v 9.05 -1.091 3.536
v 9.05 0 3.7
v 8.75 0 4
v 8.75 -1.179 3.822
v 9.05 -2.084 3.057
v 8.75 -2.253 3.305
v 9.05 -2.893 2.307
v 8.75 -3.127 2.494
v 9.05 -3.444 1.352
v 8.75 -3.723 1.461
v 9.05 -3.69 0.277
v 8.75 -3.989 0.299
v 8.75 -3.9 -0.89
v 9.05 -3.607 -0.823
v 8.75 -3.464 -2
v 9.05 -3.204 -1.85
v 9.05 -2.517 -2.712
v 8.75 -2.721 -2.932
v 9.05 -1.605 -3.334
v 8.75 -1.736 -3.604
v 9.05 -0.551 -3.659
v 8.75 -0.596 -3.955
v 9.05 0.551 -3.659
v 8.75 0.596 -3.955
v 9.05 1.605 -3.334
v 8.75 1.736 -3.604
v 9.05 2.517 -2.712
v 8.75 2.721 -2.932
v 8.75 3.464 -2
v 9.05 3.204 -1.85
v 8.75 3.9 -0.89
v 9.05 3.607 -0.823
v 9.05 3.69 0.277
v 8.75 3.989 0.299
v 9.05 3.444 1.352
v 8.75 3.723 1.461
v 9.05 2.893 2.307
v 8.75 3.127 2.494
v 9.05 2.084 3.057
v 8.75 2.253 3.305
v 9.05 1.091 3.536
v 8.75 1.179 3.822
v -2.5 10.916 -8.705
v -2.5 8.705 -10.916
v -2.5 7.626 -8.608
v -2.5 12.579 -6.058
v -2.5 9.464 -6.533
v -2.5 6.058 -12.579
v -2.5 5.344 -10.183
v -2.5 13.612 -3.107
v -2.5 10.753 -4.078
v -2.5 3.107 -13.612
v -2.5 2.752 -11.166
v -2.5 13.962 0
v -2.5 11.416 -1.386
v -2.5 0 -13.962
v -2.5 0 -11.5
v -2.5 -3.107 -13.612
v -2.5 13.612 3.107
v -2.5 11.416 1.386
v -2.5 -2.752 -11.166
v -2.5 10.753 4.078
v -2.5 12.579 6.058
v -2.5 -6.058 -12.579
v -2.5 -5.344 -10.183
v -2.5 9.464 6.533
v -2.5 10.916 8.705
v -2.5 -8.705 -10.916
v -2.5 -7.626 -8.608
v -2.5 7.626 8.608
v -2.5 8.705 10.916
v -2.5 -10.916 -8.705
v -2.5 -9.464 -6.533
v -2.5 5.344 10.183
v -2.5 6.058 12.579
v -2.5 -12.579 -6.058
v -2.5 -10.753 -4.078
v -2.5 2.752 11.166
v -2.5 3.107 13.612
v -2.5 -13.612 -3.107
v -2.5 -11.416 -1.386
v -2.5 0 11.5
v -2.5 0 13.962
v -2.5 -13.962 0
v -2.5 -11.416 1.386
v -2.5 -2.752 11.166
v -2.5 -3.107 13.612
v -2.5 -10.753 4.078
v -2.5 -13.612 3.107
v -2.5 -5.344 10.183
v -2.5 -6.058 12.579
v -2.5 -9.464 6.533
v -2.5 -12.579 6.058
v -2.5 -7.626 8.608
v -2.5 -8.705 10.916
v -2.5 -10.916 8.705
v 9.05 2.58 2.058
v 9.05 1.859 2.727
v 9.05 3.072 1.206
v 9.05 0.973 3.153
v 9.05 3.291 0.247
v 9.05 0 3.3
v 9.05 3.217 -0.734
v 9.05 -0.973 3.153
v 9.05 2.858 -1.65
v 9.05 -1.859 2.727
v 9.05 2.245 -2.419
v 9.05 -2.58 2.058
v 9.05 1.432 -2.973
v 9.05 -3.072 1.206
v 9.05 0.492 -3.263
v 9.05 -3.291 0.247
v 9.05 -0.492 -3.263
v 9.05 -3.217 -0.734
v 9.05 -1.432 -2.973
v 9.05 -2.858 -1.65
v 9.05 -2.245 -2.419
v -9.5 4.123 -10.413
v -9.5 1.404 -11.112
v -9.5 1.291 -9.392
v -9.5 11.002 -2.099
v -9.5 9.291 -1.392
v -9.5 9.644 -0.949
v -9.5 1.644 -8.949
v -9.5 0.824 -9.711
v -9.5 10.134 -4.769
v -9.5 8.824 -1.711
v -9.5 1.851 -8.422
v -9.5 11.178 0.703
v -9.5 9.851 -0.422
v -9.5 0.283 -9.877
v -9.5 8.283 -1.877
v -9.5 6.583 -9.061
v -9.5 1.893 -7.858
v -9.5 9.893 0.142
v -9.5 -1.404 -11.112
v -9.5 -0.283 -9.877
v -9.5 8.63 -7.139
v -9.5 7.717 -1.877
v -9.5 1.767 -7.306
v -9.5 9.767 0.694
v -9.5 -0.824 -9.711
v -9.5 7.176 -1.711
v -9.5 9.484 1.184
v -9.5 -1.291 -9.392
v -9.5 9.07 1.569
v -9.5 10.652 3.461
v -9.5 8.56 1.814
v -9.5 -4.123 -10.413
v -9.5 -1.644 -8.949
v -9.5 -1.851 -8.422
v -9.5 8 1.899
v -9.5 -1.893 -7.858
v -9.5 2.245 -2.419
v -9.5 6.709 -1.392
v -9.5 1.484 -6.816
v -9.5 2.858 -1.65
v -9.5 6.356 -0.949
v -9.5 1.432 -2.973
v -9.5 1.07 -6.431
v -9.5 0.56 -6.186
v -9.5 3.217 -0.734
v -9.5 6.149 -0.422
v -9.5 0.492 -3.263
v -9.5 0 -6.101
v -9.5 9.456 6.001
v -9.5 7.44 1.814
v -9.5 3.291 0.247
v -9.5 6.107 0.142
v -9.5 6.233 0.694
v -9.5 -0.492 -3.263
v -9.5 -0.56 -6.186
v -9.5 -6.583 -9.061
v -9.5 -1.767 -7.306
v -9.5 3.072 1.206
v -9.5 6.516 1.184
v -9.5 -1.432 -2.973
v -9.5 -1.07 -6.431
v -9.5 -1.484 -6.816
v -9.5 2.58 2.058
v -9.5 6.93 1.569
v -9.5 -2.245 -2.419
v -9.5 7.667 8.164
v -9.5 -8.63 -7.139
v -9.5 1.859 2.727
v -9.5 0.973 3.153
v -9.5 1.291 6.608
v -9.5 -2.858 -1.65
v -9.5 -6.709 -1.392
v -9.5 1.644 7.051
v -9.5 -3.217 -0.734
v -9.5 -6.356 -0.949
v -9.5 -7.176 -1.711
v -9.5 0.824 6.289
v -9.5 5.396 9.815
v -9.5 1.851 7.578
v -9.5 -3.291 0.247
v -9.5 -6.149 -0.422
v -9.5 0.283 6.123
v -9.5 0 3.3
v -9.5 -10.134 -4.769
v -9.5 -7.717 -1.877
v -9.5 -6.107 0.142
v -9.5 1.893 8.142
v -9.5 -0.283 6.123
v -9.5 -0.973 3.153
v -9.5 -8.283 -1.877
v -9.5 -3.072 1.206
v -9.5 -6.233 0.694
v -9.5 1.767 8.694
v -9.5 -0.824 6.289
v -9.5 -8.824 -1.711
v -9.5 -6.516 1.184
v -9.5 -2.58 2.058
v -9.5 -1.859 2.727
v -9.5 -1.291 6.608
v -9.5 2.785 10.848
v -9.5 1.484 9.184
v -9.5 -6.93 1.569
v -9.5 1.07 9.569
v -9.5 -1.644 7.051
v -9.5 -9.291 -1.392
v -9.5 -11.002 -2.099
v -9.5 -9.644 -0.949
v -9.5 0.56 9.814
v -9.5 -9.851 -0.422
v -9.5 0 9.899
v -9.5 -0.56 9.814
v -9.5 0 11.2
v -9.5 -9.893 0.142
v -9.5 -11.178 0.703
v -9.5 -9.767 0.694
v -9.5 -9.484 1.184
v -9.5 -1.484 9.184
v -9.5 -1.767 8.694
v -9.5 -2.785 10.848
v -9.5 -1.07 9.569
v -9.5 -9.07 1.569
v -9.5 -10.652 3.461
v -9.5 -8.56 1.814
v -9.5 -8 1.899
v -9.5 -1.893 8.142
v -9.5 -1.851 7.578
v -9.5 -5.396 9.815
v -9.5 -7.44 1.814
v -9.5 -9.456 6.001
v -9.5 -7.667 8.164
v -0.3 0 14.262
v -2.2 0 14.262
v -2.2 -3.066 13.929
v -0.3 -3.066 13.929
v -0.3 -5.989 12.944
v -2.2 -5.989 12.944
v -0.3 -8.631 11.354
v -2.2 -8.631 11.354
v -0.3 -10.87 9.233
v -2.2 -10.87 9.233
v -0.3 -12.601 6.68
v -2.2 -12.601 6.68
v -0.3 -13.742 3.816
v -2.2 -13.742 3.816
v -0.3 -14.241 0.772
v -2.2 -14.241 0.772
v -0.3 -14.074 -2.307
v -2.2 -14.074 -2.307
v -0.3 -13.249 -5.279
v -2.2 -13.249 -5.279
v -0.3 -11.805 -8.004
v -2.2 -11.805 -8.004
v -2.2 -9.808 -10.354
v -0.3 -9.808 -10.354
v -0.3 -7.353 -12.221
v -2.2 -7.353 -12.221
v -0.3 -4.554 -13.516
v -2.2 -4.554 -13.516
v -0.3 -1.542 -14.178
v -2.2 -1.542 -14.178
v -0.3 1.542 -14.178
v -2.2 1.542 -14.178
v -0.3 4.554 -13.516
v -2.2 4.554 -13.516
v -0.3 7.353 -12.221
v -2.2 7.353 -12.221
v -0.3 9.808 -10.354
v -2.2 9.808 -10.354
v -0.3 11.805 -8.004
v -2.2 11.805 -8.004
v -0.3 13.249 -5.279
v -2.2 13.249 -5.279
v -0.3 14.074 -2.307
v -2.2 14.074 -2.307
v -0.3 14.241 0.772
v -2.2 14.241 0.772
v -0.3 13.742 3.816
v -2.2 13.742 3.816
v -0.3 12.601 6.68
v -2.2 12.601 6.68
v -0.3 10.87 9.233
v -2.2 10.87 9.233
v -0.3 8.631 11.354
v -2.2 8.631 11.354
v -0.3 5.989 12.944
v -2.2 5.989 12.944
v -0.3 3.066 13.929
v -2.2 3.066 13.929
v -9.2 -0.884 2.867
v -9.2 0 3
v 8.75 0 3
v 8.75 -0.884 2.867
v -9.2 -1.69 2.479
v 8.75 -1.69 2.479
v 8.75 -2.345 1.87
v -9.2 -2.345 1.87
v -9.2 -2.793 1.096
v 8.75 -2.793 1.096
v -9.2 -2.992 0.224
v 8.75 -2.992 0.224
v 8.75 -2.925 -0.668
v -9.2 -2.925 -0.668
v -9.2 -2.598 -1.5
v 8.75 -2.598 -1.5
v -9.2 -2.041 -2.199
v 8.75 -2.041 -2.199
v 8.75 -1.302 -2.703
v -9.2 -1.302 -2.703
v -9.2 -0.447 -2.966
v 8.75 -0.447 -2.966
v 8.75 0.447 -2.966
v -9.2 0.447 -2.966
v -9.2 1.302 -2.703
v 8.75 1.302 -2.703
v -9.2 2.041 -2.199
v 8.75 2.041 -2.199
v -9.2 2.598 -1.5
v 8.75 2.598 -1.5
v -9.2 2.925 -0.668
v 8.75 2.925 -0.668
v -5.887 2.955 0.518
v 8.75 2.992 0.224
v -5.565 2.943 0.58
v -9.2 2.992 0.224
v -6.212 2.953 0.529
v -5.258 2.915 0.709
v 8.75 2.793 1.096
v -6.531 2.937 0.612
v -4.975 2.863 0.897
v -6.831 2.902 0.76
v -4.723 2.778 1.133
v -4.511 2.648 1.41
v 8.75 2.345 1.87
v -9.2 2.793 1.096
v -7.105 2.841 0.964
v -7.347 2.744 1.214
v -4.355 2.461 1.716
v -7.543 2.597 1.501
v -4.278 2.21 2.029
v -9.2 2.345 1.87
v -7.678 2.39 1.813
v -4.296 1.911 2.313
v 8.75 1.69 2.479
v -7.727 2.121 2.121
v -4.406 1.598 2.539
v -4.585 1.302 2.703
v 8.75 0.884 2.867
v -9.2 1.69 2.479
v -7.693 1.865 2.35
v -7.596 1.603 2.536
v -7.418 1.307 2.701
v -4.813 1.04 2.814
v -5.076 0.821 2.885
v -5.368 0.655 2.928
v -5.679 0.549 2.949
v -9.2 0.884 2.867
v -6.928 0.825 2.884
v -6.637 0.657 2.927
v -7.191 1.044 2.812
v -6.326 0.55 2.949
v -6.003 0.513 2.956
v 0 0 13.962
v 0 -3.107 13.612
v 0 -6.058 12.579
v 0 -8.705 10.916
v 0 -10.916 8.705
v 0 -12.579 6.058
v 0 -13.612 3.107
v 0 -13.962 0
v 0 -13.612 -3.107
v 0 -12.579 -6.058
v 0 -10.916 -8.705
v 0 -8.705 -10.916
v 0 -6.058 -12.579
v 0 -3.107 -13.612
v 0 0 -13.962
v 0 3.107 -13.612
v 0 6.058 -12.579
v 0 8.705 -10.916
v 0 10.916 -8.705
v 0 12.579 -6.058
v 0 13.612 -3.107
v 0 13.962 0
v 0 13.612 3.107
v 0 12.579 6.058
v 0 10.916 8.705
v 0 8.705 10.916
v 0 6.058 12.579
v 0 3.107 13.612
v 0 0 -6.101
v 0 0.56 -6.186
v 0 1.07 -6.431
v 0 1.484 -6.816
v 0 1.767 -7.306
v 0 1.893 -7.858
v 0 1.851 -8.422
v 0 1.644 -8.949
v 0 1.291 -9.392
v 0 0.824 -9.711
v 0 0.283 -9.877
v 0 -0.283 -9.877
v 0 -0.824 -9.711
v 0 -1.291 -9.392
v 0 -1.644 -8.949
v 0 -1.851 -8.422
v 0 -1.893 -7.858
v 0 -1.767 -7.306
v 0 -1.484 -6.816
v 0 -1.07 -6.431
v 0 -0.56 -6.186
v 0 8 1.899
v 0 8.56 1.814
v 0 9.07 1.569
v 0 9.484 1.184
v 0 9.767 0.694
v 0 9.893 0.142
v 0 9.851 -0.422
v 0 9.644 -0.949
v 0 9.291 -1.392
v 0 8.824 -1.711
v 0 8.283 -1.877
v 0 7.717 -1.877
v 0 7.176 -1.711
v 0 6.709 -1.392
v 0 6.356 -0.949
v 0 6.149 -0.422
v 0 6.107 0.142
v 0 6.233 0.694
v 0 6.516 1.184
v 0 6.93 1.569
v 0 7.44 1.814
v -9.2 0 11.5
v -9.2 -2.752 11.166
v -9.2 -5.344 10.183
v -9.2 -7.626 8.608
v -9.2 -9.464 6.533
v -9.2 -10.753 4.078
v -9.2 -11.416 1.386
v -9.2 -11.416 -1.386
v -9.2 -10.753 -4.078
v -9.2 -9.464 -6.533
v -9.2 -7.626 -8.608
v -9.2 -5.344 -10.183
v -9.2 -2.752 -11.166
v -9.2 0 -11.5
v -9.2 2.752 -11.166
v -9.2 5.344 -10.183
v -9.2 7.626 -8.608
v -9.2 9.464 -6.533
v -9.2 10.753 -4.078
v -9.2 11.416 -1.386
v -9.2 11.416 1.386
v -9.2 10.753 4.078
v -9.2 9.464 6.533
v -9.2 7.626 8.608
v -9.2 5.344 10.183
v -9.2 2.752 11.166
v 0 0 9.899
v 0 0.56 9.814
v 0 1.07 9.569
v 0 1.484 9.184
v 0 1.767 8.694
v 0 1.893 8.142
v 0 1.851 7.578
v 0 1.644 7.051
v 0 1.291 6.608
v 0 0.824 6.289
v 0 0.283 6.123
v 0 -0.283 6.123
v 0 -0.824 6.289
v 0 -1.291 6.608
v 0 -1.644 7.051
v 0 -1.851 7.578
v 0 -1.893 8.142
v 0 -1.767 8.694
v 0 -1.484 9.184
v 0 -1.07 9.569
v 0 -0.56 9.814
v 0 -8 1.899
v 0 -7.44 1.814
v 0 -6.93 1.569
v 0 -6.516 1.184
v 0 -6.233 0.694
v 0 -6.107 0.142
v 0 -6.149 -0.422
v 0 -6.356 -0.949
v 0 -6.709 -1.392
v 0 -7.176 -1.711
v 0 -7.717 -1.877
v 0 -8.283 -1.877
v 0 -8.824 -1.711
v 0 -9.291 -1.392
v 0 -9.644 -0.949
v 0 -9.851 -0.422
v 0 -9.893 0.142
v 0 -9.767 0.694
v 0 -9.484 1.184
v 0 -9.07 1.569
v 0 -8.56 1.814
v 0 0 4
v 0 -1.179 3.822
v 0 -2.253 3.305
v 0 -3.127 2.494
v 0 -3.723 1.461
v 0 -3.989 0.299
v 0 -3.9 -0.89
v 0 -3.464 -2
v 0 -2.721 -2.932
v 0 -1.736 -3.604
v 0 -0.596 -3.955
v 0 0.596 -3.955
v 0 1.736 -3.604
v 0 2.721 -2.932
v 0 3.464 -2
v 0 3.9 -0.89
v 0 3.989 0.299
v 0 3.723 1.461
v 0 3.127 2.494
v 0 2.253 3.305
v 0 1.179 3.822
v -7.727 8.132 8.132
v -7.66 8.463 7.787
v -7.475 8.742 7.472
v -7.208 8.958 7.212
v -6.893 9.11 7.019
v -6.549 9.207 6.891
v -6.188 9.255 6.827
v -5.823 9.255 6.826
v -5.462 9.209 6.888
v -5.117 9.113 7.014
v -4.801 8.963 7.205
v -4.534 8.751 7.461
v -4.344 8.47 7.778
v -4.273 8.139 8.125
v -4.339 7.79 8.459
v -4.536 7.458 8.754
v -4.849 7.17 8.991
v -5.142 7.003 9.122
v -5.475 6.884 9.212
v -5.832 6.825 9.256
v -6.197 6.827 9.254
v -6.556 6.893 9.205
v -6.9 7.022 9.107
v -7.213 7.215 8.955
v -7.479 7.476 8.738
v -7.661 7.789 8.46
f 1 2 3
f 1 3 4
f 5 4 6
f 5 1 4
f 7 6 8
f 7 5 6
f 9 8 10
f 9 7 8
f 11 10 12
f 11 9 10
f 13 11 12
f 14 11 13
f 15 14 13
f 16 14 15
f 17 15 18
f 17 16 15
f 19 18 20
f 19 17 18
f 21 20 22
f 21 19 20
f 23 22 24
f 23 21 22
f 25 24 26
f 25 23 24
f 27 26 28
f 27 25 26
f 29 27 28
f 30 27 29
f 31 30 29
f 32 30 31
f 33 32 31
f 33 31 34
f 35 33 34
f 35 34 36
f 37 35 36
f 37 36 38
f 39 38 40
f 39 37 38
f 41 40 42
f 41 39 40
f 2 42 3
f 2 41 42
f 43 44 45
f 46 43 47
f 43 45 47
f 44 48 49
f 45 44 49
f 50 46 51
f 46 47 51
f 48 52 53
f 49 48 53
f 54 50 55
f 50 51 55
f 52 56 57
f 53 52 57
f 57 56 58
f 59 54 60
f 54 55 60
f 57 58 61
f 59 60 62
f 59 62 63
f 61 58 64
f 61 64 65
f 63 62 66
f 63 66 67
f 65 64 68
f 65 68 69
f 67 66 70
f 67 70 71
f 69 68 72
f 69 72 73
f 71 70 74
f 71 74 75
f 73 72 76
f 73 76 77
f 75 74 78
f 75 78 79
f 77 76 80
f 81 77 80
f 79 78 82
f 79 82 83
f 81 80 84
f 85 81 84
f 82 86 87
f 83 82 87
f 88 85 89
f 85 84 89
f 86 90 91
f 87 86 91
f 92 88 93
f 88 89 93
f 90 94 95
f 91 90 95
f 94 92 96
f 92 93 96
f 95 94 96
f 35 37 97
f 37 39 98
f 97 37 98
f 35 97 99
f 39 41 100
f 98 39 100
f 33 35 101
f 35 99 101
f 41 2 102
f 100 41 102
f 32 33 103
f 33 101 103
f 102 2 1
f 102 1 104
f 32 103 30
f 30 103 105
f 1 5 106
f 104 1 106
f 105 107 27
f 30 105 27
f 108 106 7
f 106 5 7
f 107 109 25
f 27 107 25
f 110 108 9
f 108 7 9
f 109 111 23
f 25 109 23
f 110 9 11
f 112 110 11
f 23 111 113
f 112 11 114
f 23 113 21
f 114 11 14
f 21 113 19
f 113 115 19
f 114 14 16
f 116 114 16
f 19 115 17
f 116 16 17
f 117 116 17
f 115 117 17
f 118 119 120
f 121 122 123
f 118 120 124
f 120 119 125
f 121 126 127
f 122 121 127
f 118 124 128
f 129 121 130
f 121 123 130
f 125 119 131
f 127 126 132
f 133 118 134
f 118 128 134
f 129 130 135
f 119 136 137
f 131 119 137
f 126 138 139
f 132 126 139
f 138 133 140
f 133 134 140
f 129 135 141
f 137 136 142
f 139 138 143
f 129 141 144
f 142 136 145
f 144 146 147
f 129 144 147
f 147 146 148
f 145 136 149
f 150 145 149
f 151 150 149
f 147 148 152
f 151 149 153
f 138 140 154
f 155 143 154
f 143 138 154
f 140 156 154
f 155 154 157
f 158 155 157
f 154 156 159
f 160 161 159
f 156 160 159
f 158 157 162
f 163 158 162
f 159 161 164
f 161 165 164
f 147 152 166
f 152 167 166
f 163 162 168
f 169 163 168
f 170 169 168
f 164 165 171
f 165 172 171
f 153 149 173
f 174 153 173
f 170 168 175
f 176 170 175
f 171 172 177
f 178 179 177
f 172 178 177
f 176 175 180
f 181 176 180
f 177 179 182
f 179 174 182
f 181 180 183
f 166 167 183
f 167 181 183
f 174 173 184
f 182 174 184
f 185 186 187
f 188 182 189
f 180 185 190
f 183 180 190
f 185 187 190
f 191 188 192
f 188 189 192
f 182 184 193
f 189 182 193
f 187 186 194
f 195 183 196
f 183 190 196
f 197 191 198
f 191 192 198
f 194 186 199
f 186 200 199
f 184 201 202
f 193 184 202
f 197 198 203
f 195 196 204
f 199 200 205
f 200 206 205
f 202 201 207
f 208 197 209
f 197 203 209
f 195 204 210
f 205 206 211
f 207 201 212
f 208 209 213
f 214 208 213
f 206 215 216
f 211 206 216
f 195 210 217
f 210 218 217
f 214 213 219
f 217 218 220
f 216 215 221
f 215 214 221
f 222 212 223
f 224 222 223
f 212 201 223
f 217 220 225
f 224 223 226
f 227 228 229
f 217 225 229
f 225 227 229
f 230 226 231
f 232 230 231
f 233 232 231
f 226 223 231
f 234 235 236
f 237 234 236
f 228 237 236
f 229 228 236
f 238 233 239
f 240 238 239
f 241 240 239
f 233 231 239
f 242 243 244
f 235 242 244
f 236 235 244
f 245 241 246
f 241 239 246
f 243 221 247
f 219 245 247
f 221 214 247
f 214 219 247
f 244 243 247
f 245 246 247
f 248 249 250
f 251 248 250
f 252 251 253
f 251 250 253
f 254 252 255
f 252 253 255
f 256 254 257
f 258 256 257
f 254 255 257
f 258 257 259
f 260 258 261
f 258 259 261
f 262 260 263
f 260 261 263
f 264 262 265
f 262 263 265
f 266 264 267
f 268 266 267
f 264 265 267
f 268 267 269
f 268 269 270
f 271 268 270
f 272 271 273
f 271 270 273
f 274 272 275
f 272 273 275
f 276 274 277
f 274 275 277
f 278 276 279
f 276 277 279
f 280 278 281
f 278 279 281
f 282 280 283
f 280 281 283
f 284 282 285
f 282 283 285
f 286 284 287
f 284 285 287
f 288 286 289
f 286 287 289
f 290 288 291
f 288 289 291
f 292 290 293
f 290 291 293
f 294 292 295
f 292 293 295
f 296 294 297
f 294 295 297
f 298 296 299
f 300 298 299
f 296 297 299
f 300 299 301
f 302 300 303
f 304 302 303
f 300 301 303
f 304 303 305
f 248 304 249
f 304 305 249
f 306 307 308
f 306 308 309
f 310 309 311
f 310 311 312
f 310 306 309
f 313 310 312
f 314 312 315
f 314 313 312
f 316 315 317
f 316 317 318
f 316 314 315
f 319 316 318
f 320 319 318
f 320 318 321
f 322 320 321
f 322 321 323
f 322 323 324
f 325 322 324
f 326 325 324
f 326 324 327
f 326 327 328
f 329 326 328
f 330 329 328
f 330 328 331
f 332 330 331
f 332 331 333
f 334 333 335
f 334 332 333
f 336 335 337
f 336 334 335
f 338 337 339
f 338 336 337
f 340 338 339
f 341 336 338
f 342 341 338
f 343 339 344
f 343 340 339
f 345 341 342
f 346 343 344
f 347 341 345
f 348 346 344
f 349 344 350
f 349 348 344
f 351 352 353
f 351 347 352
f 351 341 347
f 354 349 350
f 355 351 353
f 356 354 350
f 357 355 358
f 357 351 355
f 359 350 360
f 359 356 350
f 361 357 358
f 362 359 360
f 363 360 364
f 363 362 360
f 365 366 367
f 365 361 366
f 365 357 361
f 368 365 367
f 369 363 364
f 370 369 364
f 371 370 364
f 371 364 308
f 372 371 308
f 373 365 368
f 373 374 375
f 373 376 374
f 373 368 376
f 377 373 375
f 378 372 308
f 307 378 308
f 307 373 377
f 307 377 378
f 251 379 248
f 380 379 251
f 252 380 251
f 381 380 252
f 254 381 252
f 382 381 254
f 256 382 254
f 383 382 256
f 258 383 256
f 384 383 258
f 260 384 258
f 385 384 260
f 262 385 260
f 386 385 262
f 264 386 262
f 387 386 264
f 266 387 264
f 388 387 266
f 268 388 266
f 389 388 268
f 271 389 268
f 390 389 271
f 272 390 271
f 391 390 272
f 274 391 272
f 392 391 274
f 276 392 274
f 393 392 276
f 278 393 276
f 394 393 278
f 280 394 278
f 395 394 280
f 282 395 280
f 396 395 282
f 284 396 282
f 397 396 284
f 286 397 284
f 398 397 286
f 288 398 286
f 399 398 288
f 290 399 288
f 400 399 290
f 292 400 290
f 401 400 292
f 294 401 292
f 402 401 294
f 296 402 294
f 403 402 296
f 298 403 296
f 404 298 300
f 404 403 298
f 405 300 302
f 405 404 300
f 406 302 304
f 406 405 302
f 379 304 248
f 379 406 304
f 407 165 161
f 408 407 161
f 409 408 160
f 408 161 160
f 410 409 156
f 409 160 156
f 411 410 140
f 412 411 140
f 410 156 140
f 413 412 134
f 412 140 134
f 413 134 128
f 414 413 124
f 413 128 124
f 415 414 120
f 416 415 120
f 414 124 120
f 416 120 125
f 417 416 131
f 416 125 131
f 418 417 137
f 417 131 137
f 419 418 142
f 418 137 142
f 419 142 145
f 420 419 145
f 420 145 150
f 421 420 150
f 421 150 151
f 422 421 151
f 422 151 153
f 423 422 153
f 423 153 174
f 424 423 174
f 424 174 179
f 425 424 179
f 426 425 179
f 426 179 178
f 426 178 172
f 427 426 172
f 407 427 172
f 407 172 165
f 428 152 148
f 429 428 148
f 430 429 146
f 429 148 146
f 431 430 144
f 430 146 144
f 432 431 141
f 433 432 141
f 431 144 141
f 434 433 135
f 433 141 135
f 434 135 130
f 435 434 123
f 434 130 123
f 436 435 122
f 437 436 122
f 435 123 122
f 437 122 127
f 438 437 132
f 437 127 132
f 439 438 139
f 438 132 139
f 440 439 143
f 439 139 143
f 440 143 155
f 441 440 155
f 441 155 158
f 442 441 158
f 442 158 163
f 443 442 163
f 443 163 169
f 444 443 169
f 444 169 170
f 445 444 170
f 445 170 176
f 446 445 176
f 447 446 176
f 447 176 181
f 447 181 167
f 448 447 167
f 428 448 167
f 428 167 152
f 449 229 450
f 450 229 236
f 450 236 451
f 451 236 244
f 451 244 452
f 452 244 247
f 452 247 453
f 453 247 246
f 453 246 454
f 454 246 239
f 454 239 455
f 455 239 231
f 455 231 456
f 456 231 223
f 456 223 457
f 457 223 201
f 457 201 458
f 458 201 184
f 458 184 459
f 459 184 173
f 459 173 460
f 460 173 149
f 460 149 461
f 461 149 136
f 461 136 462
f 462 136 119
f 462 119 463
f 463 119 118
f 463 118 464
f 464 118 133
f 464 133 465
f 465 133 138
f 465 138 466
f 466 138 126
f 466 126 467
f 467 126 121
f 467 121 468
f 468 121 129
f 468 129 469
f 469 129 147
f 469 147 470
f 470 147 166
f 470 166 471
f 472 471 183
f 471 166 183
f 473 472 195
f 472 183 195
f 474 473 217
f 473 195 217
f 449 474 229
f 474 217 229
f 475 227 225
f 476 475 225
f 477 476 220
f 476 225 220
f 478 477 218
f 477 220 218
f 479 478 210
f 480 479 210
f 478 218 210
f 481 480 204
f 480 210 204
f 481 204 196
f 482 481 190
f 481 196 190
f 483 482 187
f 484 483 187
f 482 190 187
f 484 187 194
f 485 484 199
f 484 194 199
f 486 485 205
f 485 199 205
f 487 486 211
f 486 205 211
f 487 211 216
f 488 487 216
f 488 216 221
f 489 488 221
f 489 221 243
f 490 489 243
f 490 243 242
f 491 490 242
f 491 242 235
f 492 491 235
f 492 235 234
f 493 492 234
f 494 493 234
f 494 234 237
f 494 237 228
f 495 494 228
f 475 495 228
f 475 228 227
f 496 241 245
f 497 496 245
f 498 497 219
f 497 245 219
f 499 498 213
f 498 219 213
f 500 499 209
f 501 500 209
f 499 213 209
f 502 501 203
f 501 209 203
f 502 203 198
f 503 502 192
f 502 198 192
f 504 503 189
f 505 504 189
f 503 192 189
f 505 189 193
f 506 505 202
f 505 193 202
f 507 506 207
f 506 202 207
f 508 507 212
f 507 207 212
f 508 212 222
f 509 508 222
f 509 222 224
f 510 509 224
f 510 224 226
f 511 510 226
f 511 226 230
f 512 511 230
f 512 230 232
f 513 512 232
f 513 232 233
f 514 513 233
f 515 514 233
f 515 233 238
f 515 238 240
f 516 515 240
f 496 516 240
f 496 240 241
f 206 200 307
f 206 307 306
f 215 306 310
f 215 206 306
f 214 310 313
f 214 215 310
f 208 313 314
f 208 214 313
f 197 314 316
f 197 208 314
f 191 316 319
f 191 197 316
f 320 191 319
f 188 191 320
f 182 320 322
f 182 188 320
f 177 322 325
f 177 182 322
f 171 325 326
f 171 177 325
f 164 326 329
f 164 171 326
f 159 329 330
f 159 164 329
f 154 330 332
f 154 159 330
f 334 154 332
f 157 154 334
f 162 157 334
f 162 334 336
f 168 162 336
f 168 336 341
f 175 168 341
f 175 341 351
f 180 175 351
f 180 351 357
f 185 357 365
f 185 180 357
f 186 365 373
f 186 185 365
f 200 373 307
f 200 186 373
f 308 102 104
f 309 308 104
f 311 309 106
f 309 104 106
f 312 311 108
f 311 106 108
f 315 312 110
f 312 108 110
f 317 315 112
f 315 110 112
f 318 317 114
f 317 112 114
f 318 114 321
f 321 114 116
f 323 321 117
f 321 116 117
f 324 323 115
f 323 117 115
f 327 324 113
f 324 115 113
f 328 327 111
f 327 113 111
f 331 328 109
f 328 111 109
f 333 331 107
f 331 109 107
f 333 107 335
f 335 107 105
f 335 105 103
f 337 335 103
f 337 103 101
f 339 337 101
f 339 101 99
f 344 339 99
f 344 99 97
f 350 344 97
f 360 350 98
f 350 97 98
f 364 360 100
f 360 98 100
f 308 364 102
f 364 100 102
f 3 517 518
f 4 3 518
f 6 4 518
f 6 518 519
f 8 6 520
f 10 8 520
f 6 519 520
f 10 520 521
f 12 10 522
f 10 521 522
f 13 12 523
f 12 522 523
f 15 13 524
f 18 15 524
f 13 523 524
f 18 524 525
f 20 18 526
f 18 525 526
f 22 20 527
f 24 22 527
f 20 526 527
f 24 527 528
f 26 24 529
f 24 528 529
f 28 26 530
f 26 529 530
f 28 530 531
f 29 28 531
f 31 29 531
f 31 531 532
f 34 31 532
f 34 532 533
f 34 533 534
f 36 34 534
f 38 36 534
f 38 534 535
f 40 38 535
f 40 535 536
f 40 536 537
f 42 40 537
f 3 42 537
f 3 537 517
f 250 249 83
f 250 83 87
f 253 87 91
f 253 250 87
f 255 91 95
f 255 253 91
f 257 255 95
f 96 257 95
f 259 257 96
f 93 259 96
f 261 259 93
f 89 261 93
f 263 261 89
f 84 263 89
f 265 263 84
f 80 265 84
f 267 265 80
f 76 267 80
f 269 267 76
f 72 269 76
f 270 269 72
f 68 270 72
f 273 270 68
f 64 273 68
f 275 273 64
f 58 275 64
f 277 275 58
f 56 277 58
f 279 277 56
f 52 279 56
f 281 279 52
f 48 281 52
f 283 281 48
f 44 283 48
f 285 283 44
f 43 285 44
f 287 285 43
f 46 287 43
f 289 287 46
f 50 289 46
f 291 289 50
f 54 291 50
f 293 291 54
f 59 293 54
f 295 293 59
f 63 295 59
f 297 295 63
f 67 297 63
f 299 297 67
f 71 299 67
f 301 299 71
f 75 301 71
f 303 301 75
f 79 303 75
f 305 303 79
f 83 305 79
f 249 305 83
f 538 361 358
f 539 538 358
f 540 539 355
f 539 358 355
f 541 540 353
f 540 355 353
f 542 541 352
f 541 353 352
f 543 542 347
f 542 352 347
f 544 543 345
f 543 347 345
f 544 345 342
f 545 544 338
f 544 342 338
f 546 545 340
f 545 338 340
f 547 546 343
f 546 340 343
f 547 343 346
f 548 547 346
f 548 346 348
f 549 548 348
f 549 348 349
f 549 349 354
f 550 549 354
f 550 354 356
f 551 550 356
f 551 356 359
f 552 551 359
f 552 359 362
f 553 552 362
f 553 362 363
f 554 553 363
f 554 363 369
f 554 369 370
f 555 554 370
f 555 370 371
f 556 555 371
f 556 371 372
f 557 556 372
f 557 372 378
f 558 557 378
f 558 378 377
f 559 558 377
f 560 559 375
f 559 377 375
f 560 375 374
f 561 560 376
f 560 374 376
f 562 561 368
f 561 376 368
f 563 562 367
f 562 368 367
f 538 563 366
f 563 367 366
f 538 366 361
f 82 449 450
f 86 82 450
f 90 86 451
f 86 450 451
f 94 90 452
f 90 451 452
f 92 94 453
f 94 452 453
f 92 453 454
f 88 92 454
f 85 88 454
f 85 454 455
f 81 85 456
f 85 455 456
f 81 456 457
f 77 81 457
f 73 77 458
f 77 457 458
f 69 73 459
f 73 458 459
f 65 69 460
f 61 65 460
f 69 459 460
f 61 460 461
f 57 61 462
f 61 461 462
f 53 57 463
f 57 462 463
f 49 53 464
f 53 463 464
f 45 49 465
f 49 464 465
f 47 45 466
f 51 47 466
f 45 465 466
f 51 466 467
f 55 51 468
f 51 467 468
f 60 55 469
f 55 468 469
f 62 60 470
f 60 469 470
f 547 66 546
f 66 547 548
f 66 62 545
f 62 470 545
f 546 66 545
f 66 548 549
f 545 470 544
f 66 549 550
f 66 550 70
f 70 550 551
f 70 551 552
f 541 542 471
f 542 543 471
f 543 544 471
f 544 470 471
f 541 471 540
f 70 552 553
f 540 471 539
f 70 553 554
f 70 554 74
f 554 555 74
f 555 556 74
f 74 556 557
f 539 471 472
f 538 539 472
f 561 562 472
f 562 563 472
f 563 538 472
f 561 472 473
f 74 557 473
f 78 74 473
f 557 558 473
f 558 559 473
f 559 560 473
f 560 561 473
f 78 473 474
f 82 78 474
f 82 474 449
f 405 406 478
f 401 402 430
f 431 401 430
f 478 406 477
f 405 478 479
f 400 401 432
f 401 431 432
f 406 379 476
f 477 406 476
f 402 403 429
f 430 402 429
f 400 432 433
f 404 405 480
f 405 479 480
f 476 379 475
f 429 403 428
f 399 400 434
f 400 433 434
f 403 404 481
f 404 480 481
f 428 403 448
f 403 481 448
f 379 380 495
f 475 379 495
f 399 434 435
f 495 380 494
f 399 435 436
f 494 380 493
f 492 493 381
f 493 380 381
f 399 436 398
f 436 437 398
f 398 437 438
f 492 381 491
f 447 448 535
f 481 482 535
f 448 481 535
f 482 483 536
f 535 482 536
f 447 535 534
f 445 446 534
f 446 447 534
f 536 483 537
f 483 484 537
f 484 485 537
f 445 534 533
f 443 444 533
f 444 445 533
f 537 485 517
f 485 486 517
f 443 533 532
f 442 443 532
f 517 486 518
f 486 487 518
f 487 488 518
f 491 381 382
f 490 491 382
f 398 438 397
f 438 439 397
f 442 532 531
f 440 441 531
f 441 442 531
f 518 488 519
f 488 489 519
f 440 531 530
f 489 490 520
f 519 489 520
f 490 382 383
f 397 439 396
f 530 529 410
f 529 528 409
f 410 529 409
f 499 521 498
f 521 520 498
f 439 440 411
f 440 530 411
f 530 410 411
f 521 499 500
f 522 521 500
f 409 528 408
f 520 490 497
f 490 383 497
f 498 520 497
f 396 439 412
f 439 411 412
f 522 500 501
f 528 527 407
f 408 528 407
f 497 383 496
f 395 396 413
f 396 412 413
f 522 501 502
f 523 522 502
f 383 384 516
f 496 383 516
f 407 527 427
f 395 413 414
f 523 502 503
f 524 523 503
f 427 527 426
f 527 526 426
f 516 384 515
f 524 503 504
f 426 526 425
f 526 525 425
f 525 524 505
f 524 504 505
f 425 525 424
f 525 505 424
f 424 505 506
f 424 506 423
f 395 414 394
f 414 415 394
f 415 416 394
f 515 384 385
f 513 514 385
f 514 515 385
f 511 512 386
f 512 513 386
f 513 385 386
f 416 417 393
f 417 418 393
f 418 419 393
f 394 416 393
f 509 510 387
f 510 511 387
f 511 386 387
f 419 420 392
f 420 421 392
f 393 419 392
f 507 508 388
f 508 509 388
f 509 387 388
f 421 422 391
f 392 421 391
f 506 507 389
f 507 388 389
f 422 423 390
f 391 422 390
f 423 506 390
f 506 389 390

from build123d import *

# Parameters (mm, degrees)
F_6_CLEARANCE_HOLE1_D     = 3.7973
BOSS_EXTRUDE1_START       = 10
SKETCH4_R                 = 1.25
BOSS_EXTRUDE1_DEPTH       = 1.5
F_8_32_TAPPED_HOLE1_D     = 3.4544
F_8_32_TAPPED_HOLE1_DEPTH = 10.708
F_8_32_TAPPED_HOLE1_TIP   = 1.037806461
MOVE_FACE1_BY             = 6.55
CHAMFER1_SIZE             = 0.3


with BuildPart() as part:
    # Sketch1 → Revolve1 (revolve)
    with BuildSketch(Plane.XY):
        Polygon((-9.5, 3), (2.5, 3), (2.5, 4), (0, 4), (0, 14.2621), (-2.5, 14.2621), (-2.5, 11.5), (-9.5, 11.5), align=None)
    revolve(axis=Axis((0, 0, 0), (1, 0, 0)))

    # #6 Clearance Hole1 (through all)
    with Locations(Plane(origin=(0, 0, 0), x_dir=(0, 0, -1), z_dir=(1, 0, 0))):
        with Locations((-8, 0), (0, 8), (0, -8), (8, 0)):
            Hole(F_6_CLEARANCE_HOLE1_D / 2)

    # Sketch4 → Boss-Extrude1 (add)
    with BuildSketch(Plane(origin=(0, 0, 0), x_dir=(-1, 0, 0), z_dir=(0, 0.7071067811865464, 0.7071067811865488)).offset(BOSS_EXTRUDE1_START)):
        with Locations((6, 0)):
            Circle(SKETCH4_R)
    extrude(amount=BOSS_EXTRUDE1_DEPTH)

    # #8-32 Tapped Hole1
    with Locations(Plane(origin=(0, 8.131727984, 8.131727984), x_dir=(1, 0, 0), z_dir=(0, 0.7071067811865465, 0.7071067811865487))):
        with Locations((-6, 0)):
            Hole(F_8_32_TAPPED_HOLE1_D / 2, depth=F_8_32_TAPPED_HOLE1_DEPTH)
            with Locations((0, 0, -(F_8_32_TAPPED_HOLE1_DEPTH + F_8_32_TAPPED_HOLE1_TIP / 2))):  # 118° drill point
                Cone(0, F_8_32_TAPPED_HOLE1_D / 2, F_8_32_TAPPED_HOLE1_TIP, mode=Mode.SUBTRACT)

    # Move Face1: a face moved outward by 6.55
    extrude(part.faces().sort_by_distance((2.5, 0, -3.2))[0], amount=MOVE_FACE1_BY, dir=(1, 0, 0))

    # Chamfer1
    chamfer1_edges = [part.edges().sort_by_distance(p)[0] for p in [
        (-9.5, -11.5, 0),
        (-2.5, -14.2621, 0),
        (0, -14.2621, 0),
        (9.05, -3, 0),
        (9.05, -4, 0),
        (-9.5, -3, 0),
    ]]
    chamfer(chamfer1_edges, length=CHAMFER1_SIZE)


solid = part.part
